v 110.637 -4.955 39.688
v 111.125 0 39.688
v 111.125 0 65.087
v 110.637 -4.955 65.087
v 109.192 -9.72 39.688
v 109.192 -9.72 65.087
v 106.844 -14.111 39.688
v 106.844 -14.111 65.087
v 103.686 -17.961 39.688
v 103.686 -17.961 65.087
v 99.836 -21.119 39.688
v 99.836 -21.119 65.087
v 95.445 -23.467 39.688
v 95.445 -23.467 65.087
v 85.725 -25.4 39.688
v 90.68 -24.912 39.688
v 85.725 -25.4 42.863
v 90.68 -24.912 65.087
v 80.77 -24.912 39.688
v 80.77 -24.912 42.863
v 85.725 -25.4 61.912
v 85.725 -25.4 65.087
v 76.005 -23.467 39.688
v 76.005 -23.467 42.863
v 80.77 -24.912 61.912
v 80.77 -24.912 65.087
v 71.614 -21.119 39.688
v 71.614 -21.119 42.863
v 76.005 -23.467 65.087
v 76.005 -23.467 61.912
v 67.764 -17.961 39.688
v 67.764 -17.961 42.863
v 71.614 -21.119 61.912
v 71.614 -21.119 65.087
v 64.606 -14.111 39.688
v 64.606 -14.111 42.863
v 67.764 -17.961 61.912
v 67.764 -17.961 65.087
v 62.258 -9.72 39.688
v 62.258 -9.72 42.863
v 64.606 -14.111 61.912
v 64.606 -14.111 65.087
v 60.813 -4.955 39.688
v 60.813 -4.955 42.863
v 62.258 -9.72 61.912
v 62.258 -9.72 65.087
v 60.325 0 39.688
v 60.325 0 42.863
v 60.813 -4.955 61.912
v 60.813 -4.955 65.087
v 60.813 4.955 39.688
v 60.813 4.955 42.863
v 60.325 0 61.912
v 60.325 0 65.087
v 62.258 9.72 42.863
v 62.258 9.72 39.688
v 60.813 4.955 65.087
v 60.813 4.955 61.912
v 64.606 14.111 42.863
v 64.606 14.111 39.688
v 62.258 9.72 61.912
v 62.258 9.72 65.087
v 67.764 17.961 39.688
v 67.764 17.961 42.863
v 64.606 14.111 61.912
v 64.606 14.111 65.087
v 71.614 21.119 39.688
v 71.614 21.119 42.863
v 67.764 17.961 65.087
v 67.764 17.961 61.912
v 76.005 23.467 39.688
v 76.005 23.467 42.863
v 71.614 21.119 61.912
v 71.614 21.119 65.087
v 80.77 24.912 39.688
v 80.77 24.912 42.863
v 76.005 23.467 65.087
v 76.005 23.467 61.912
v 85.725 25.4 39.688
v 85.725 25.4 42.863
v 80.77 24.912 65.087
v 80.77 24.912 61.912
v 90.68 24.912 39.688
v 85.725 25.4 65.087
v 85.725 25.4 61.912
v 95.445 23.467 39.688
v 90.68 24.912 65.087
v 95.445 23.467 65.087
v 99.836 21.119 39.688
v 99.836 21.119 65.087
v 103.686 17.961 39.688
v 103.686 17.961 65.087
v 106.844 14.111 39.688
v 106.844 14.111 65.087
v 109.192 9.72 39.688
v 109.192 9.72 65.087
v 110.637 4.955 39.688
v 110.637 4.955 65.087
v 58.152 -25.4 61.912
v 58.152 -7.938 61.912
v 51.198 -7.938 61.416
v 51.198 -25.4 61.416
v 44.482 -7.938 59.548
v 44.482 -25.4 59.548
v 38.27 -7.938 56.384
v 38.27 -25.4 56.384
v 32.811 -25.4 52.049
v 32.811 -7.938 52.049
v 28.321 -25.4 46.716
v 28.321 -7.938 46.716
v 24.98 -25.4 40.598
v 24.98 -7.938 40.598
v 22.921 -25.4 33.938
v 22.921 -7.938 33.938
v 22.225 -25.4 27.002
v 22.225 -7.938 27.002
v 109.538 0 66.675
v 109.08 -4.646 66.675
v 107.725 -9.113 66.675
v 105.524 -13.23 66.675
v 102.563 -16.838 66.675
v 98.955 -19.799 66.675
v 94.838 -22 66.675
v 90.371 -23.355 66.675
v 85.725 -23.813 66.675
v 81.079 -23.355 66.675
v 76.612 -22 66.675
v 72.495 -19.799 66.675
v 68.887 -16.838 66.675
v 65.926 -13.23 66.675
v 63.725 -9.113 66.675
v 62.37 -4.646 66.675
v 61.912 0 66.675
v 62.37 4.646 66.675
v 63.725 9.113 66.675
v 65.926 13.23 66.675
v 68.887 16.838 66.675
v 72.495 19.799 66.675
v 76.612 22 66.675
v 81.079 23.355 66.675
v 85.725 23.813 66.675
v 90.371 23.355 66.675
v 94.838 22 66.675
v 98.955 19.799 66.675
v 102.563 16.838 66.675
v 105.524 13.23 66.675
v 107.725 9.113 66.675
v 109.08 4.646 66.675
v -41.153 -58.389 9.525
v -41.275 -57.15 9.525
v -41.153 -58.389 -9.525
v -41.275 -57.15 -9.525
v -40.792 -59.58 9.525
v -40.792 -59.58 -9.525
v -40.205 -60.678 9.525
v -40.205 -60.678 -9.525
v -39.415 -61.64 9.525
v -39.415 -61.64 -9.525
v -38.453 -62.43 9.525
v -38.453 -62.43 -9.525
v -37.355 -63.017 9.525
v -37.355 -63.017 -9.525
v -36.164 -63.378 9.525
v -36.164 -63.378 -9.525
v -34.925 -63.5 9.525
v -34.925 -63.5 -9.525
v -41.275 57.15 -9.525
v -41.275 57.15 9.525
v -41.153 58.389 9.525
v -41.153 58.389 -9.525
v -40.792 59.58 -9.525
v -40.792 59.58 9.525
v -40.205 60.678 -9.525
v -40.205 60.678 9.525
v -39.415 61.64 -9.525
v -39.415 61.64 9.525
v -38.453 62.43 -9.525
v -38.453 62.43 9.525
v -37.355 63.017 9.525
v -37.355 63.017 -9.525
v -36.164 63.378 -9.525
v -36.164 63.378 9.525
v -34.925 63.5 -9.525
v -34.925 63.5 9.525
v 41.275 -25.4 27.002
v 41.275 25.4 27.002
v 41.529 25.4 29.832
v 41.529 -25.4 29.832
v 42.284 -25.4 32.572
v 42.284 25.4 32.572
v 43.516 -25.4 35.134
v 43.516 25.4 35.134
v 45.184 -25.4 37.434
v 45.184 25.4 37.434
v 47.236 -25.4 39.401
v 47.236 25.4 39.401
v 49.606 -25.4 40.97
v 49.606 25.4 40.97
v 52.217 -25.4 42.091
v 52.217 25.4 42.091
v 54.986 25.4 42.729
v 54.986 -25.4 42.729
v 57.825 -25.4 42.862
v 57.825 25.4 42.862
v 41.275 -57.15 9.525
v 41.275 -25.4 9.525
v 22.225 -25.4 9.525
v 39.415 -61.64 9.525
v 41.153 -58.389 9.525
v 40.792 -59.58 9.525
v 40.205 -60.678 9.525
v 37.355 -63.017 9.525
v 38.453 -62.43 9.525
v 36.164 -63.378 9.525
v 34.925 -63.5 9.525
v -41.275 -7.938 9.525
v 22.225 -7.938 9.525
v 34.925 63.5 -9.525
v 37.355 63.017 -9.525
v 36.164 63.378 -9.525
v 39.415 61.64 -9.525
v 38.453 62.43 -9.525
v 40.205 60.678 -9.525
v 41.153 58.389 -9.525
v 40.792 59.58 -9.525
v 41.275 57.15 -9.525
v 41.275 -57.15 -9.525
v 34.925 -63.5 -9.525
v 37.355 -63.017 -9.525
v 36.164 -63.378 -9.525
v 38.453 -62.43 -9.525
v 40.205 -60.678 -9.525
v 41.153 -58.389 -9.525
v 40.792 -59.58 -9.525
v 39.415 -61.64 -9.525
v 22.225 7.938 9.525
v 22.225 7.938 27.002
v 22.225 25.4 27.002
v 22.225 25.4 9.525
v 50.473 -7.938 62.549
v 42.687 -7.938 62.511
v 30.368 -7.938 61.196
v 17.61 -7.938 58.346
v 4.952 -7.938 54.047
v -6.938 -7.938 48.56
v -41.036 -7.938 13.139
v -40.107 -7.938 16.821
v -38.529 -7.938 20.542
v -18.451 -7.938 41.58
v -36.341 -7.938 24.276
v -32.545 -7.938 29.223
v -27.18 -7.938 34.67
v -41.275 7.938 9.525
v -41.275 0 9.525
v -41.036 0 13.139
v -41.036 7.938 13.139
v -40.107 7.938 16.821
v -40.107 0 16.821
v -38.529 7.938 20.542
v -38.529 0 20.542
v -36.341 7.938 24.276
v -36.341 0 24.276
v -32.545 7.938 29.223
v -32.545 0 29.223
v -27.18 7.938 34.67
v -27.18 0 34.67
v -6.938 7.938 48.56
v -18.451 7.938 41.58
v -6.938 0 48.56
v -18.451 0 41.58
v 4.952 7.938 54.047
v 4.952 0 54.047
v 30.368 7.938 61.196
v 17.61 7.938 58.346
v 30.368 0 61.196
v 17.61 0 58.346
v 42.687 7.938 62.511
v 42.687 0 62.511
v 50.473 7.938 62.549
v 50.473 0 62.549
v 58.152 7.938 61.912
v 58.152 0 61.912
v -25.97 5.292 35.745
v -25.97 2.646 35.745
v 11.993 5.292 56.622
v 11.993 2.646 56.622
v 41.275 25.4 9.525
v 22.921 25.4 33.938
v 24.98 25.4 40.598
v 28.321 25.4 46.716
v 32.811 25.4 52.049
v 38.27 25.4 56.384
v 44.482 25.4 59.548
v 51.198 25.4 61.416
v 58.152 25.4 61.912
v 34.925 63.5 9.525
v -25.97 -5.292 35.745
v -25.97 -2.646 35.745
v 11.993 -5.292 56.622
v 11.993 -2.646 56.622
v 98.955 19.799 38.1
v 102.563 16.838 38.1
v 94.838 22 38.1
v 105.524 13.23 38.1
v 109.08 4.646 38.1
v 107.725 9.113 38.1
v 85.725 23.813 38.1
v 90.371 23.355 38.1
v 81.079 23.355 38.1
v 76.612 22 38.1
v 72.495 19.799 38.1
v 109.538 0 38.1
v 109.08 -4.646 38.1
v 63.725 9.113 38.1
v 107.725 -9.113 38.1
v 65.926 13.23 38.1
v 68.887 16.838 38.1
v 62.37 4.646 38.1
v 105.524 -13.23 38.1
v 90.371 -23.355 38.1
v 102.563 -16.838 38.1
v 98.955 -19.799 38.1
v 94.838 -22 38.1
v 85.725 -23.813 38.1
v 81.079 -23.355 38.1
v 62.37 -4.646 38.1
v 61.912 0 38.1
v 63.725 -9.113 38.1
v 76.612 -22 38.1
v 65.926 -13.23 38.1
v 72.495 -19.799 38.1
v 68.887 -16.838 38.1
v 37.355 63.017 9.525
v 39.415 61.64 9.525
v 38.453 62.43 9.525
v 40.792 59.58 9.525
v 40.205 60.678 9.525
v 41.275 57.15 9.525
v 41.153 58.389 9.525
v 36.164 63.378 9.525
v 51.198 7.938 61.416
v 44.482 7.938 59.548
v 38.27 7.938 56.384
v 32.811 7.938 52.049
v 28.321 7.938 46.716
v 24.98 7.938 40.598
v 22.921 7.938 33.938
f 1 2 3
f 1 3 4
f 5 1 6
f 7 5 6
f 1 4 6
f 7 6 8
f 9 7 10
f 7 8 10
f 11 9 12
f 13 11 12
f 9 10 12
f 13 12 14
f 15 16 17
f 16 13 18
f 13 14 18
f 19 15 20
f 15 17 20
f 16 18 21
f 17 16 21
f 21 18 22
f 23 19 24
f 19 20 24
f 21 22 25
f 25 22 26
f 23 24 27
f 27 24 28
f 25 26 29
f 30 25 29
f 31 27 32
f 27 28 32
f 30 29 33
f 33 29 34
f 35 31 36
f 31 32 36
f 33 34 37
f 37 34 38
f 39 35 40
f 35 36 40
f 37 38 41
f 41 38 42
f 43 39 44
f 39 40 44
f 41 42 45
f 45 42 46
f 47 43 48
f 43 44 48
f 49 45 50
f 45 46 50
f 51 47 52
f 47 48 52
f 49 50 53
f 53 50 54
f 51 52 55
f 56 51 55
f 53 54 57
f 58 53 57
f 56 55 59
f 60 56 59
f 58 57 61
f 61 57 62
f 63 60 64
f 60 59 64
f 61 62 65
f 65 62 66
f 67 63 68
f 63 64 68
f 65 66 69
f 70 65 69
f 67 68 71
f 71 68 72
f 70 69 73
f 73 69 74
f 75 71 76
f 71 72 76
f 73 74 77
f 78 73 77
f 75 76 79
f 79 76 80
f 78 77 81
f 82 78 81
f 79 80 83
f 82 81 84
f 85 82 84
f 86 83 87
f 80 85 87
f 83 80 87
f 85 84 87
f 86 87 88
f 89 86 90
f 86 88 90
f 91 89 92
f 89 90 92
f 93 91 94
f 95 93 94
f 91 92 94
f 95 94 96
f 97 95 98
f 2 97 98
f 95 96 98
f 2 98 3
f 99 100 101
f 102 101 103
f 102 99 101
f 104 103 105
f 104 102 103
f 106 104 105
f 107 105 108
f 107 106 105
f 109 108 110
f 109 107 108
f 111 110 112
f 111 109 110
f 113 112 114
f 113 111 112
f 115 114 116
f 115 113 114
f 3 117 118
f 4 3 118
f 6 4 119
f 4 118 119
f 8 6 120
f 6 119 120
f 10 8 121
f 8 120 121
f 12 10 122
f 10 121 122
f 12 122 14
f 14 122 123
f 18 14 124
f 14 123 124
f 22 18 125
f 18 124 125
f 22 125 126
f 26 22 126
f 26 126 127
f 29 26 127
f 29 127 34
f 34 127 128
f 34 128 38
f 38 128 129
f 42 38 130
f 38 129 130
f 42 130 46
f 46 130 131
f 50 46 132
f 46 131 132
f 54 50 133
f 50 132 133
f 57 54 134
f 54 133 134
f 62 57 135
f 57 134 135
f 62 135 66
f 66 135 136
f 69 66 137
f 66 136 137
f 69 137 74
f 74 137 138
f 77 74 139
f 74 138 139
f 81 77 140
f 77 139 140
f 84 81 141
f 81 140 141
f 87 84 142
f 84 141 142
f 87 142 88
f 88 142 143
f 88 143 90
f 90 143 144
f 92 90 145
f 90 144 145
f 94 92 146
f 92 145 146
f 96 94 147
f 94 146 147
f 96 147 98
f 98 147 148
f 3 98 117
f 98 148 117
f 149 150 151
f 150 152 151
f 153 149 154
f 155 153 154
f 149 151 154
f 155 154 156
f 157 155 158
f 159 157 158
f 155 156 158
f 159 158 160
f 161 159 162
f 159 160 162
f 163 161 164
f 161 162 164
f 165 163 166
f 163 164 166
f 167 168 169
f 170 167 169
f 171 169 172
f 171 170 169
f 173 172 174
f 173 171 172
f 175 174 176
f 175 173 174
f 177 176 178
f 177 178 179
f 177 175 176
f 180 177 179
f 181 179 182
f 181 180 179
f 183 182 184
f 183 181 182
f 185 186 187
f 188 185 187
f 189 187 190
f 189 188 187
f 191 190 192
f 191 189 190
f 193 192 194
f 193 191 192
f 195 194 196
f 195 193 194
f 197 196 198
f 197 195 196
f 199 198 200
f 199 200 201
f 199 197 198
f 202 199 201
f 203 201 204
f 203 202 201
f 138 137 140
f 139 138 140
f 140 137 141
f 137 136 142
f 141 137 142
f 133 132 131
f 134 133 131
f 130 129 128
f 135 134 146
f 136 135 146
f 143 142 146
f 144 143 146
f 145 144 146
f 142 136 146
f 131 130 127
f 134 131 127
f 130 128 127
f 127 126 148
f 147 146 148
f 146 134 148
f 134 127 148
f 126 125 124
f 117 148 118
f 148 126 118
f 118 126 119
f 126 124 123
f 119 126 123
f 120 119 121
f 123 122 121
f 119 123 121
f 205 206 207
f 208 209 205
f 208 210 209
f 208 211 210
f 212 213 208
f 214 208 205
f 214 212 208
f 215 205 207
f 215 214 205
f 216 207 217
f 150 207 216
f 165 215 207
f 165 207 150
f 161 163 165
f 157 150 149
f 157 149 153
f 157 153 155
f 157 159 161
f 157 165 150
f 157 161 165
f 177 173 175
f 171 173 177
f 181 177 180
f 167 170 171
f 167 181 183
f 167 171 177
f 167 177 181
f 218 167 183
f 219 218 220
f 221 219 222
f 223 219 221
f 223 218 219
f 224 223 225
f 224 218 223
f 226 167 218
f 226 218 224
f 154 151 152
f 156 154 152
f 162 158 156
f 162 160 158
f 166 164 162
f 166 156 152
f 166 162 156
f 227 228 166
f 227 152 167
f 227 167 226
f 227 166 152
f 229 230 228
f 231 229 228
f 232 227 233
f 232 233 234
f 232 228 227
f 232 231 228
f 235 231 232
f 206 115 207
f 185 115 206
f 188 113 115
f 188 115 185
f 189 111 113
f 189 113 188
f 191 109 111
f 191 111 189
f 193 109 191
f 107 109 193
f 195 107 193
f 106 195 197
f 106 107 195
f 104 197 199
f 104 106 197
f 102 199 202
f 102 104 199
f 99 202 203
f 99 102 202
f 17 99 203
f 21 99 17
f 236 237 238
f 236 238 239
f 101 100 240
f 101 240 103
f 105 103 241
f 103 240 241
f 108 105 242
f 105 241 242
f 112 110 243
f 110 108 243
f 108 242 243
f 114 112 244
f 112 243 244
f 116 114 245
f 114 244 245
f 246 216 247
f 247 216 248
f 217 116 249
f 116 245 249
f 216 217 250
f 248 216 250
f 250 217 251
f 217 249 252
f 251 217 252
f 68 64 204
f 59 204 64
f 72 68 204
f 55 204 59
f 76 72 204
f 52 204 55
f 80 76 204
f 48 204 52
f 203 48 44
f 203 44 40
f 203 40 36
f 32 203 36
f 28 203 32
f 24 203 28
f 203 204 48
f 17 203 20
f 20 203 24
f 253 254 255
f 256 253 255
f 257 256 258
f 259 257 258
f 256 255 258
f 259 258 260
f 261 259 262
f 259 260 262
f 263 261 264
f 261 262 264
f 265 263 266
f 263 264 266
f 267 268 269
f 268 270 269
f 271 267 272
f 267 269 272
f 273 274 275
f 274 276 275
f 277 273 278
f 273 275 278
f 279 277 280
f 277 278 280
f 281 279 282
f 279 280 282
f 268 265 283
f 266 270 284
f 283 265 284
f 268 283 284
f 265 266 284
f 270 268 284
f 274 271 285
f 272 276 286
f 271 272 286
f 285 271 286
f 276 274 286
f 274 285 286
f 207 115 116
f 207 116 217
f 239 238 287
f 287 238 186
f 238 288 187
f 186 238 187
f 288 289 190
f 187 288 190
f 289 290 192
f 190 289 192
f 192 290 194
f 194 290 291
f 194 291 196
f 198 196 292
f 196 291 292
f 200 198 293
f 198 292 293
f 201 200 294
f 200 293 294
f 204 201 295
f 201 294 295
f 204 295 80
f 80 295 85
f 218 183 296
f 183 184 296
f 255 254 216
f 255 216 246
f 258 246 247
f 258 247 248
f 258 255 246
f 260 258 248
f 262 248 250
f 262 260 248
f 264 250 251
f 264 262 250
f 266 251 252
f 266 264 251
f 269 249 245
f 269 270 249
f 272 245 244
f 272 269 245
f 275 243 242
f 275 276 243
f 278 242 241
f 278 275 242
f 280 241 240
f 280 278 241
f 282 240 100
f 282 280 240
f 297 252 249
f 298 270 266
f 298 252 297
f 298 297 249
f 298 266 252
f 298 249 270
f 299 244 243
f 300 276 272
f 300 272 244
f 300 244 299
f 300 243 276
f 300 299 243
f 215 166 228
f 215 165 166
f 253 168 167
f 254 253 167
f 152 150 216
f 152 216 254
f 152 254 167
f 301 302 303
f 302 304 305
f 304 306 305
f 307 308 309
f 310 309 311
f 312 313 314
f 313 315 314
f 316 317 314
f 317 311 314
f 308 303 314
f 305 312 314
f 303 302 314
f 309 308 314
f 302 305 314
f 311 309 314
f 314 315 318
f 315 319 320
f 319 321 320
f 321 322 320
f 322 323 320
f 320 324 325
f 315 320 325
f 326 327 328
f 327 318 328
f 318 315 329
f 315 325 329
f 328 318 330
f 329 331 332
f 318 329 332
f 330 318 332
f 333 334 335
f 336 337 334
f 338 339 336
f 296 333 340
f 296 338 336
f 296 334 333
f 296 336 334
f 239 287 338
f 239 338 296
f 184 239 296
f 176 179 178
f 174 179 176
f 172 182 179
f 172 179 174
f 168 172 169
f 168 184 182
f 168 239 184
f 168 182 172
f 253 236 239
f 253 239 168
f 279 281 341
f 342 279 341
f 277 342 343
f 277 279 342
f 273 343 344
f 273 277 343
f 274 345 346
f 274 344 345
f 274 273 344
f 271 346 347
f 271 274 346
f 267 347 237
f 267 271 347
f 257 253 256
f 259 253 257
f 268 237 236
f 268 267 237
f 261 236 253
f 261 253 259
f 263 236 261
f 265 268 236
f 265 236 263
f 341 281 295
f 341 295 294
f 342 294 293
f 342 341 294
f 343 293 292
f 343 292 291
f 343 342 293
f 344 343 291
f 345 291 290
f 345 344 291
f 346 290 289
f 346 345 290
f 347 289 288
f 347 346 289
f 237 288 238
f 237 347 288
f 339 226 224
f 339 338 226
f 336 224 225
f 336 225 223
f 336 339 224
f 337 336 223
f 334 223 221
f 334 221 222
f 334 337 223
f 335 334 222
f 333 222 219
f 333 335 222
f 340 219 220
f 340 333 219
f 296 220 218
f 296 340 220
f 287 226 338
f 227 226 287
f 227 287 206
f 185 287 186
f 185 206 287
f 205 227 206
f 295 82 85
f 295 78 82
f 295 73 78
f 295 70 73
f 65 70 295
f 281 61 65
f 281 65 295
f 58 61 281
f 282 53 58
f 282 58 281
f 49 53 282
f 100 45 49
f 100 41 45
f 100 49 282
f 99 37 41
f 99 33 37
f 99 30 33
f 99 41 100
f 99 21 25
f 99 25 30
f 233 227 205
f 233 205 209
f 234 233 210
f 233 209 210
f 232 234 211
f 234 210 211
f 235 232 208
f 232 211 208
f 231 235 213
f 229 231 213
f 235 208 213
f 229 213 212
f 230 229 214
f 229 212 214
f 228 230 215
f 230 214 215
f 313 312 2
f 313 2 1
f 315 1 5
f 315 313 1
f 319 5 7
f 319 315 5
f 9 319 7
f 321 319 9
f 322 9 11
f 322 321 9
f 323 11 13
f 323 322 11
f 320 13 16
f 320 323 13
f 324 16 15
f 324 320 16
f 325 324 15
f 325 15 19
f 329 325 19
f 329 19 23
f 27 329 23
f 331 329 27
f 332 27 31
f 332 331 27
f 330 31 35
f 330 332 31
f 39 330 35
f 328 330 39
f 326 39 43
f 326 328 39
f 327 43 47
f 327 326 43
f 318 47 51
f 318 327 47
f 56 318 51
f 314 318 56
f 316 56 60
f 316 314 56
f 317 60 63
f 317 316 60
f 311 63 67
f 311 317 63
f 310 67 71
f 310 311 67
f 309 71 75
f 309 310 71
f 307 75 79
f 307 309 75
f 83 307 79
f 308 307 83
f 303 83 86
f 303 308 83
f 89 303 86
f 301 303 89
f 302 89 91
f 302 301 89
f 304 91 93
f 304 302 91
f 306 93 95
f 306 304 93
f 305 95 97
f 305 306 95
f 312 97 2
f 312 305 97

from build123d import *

# Parameters (mm, degrees)
F1_DEPTH = 63.5
F0_W     = 25.4
F0_H     = 19.05
F2_DEPTH = 25.4
F3_DEPTH = 7.9375
F5_R     = 6.35
F6_SIZE  = 1.5875


with BuildPart() as f1:
    # F0 (on Front) → F1 (new body, symmetric)
    with BuildSketch(Plane.XZ):
        Polygon((-41.275, -9.525), (41.275, -9.525), (41.275, 9.525), (22.225, 9.525), (-41.275, 9.525), align=None)
    extrude(amount=F1_DEPTH, both=True)

    # F0 (on Front) → F2 (join, symmetric)
    with BuildSketch(Plane.XZ):
        with BuildLine():
            Line((22.225, 9.525), (41.275, 9.525))
            Line((41.275, 9.525), (41.275, 27.0018676308))
            ThreePointArc((41.275, 27.0018676308), (46.1660118217, 38.4634394558), (57.8252524344, 42.8625))
            Line((57.8252524344, 42.8625), (60.325, 42.8625))
            Line((60.325, 42.8625), (60.325, 61.9125))
            Line((60.325, 61.9125), (58.151684873, 61.9125))
            ThreePointArc((58.151684873, 61.9125), (32.8110211717, 52.0492174826), (22.225, 27.0018676308))
            Line((22.225, 27.0018676308), (22.225, 9.525))
        make_face()
        with Locations((73.025, 52.3875)):
            Rectangle(F0_W, F0_H)
    extrude(amount=F2_DEPTH, both=True)

    # F0 (on Front) → F3 (join, symmetric)
    with BuildSketch(Plane.XZ):
        with BuildLine():
            add(Edge.make_bspline(
                [(-41.275, 9.525), (-42.120564729, 35.0021496415), (12.7173494548, 67.8302869201), (58.151684873, 61.9125)],
                knots=[0, 0, 0, 0, 112.3837880706, 112.3837880706, 112.3837880706, 112.3837880706], degree=3))
            Line((-41.275, 9.525), (22.225, 9.525))
            Line((22.225, 9.525), (22.225, 27.0018676308))
            ThreePointArc((22.225, 27.0018676308), (32.8110211717, 52.0492174826), (58.151684873, 61.9125))
        make_face()
    extrude(amount=F3_DEPTH, both=True)

    # F0 (on Front) → F4 (revolve)
    with BuildSketch(Plane.XZ):
        Polygon((85.725, 66.675), (85.725, 61.9125), (85.725, 42.8625), (85.725, 38.1), (111.125, 38.1), (111.125, 66.675), align=None)
    revolve(axis=Axis((85.725, 0, 52.3875), (0, 0, -1)))

    # F5
    f5_edges = [f1.edges().sort_by_distance(p)[0] for p in [
        (41.275, -63.5, 0),
        (41.275, 63.5, 0),
        (-41.275, -63.5, 0),
        (-41.275, 63.5, 0),
    ]]
    fillet(f5_edges, radius=F5_R)

    # F6
    f6_edges = [f1.edges().sort_by_distance(p)[0] for p in [
        (60.325, 0, 66.675),
        (60.325, 0, 38.1),
    ]]
    chamfer(f6_edges, length=F6_SIZE)


solid = f1.part
